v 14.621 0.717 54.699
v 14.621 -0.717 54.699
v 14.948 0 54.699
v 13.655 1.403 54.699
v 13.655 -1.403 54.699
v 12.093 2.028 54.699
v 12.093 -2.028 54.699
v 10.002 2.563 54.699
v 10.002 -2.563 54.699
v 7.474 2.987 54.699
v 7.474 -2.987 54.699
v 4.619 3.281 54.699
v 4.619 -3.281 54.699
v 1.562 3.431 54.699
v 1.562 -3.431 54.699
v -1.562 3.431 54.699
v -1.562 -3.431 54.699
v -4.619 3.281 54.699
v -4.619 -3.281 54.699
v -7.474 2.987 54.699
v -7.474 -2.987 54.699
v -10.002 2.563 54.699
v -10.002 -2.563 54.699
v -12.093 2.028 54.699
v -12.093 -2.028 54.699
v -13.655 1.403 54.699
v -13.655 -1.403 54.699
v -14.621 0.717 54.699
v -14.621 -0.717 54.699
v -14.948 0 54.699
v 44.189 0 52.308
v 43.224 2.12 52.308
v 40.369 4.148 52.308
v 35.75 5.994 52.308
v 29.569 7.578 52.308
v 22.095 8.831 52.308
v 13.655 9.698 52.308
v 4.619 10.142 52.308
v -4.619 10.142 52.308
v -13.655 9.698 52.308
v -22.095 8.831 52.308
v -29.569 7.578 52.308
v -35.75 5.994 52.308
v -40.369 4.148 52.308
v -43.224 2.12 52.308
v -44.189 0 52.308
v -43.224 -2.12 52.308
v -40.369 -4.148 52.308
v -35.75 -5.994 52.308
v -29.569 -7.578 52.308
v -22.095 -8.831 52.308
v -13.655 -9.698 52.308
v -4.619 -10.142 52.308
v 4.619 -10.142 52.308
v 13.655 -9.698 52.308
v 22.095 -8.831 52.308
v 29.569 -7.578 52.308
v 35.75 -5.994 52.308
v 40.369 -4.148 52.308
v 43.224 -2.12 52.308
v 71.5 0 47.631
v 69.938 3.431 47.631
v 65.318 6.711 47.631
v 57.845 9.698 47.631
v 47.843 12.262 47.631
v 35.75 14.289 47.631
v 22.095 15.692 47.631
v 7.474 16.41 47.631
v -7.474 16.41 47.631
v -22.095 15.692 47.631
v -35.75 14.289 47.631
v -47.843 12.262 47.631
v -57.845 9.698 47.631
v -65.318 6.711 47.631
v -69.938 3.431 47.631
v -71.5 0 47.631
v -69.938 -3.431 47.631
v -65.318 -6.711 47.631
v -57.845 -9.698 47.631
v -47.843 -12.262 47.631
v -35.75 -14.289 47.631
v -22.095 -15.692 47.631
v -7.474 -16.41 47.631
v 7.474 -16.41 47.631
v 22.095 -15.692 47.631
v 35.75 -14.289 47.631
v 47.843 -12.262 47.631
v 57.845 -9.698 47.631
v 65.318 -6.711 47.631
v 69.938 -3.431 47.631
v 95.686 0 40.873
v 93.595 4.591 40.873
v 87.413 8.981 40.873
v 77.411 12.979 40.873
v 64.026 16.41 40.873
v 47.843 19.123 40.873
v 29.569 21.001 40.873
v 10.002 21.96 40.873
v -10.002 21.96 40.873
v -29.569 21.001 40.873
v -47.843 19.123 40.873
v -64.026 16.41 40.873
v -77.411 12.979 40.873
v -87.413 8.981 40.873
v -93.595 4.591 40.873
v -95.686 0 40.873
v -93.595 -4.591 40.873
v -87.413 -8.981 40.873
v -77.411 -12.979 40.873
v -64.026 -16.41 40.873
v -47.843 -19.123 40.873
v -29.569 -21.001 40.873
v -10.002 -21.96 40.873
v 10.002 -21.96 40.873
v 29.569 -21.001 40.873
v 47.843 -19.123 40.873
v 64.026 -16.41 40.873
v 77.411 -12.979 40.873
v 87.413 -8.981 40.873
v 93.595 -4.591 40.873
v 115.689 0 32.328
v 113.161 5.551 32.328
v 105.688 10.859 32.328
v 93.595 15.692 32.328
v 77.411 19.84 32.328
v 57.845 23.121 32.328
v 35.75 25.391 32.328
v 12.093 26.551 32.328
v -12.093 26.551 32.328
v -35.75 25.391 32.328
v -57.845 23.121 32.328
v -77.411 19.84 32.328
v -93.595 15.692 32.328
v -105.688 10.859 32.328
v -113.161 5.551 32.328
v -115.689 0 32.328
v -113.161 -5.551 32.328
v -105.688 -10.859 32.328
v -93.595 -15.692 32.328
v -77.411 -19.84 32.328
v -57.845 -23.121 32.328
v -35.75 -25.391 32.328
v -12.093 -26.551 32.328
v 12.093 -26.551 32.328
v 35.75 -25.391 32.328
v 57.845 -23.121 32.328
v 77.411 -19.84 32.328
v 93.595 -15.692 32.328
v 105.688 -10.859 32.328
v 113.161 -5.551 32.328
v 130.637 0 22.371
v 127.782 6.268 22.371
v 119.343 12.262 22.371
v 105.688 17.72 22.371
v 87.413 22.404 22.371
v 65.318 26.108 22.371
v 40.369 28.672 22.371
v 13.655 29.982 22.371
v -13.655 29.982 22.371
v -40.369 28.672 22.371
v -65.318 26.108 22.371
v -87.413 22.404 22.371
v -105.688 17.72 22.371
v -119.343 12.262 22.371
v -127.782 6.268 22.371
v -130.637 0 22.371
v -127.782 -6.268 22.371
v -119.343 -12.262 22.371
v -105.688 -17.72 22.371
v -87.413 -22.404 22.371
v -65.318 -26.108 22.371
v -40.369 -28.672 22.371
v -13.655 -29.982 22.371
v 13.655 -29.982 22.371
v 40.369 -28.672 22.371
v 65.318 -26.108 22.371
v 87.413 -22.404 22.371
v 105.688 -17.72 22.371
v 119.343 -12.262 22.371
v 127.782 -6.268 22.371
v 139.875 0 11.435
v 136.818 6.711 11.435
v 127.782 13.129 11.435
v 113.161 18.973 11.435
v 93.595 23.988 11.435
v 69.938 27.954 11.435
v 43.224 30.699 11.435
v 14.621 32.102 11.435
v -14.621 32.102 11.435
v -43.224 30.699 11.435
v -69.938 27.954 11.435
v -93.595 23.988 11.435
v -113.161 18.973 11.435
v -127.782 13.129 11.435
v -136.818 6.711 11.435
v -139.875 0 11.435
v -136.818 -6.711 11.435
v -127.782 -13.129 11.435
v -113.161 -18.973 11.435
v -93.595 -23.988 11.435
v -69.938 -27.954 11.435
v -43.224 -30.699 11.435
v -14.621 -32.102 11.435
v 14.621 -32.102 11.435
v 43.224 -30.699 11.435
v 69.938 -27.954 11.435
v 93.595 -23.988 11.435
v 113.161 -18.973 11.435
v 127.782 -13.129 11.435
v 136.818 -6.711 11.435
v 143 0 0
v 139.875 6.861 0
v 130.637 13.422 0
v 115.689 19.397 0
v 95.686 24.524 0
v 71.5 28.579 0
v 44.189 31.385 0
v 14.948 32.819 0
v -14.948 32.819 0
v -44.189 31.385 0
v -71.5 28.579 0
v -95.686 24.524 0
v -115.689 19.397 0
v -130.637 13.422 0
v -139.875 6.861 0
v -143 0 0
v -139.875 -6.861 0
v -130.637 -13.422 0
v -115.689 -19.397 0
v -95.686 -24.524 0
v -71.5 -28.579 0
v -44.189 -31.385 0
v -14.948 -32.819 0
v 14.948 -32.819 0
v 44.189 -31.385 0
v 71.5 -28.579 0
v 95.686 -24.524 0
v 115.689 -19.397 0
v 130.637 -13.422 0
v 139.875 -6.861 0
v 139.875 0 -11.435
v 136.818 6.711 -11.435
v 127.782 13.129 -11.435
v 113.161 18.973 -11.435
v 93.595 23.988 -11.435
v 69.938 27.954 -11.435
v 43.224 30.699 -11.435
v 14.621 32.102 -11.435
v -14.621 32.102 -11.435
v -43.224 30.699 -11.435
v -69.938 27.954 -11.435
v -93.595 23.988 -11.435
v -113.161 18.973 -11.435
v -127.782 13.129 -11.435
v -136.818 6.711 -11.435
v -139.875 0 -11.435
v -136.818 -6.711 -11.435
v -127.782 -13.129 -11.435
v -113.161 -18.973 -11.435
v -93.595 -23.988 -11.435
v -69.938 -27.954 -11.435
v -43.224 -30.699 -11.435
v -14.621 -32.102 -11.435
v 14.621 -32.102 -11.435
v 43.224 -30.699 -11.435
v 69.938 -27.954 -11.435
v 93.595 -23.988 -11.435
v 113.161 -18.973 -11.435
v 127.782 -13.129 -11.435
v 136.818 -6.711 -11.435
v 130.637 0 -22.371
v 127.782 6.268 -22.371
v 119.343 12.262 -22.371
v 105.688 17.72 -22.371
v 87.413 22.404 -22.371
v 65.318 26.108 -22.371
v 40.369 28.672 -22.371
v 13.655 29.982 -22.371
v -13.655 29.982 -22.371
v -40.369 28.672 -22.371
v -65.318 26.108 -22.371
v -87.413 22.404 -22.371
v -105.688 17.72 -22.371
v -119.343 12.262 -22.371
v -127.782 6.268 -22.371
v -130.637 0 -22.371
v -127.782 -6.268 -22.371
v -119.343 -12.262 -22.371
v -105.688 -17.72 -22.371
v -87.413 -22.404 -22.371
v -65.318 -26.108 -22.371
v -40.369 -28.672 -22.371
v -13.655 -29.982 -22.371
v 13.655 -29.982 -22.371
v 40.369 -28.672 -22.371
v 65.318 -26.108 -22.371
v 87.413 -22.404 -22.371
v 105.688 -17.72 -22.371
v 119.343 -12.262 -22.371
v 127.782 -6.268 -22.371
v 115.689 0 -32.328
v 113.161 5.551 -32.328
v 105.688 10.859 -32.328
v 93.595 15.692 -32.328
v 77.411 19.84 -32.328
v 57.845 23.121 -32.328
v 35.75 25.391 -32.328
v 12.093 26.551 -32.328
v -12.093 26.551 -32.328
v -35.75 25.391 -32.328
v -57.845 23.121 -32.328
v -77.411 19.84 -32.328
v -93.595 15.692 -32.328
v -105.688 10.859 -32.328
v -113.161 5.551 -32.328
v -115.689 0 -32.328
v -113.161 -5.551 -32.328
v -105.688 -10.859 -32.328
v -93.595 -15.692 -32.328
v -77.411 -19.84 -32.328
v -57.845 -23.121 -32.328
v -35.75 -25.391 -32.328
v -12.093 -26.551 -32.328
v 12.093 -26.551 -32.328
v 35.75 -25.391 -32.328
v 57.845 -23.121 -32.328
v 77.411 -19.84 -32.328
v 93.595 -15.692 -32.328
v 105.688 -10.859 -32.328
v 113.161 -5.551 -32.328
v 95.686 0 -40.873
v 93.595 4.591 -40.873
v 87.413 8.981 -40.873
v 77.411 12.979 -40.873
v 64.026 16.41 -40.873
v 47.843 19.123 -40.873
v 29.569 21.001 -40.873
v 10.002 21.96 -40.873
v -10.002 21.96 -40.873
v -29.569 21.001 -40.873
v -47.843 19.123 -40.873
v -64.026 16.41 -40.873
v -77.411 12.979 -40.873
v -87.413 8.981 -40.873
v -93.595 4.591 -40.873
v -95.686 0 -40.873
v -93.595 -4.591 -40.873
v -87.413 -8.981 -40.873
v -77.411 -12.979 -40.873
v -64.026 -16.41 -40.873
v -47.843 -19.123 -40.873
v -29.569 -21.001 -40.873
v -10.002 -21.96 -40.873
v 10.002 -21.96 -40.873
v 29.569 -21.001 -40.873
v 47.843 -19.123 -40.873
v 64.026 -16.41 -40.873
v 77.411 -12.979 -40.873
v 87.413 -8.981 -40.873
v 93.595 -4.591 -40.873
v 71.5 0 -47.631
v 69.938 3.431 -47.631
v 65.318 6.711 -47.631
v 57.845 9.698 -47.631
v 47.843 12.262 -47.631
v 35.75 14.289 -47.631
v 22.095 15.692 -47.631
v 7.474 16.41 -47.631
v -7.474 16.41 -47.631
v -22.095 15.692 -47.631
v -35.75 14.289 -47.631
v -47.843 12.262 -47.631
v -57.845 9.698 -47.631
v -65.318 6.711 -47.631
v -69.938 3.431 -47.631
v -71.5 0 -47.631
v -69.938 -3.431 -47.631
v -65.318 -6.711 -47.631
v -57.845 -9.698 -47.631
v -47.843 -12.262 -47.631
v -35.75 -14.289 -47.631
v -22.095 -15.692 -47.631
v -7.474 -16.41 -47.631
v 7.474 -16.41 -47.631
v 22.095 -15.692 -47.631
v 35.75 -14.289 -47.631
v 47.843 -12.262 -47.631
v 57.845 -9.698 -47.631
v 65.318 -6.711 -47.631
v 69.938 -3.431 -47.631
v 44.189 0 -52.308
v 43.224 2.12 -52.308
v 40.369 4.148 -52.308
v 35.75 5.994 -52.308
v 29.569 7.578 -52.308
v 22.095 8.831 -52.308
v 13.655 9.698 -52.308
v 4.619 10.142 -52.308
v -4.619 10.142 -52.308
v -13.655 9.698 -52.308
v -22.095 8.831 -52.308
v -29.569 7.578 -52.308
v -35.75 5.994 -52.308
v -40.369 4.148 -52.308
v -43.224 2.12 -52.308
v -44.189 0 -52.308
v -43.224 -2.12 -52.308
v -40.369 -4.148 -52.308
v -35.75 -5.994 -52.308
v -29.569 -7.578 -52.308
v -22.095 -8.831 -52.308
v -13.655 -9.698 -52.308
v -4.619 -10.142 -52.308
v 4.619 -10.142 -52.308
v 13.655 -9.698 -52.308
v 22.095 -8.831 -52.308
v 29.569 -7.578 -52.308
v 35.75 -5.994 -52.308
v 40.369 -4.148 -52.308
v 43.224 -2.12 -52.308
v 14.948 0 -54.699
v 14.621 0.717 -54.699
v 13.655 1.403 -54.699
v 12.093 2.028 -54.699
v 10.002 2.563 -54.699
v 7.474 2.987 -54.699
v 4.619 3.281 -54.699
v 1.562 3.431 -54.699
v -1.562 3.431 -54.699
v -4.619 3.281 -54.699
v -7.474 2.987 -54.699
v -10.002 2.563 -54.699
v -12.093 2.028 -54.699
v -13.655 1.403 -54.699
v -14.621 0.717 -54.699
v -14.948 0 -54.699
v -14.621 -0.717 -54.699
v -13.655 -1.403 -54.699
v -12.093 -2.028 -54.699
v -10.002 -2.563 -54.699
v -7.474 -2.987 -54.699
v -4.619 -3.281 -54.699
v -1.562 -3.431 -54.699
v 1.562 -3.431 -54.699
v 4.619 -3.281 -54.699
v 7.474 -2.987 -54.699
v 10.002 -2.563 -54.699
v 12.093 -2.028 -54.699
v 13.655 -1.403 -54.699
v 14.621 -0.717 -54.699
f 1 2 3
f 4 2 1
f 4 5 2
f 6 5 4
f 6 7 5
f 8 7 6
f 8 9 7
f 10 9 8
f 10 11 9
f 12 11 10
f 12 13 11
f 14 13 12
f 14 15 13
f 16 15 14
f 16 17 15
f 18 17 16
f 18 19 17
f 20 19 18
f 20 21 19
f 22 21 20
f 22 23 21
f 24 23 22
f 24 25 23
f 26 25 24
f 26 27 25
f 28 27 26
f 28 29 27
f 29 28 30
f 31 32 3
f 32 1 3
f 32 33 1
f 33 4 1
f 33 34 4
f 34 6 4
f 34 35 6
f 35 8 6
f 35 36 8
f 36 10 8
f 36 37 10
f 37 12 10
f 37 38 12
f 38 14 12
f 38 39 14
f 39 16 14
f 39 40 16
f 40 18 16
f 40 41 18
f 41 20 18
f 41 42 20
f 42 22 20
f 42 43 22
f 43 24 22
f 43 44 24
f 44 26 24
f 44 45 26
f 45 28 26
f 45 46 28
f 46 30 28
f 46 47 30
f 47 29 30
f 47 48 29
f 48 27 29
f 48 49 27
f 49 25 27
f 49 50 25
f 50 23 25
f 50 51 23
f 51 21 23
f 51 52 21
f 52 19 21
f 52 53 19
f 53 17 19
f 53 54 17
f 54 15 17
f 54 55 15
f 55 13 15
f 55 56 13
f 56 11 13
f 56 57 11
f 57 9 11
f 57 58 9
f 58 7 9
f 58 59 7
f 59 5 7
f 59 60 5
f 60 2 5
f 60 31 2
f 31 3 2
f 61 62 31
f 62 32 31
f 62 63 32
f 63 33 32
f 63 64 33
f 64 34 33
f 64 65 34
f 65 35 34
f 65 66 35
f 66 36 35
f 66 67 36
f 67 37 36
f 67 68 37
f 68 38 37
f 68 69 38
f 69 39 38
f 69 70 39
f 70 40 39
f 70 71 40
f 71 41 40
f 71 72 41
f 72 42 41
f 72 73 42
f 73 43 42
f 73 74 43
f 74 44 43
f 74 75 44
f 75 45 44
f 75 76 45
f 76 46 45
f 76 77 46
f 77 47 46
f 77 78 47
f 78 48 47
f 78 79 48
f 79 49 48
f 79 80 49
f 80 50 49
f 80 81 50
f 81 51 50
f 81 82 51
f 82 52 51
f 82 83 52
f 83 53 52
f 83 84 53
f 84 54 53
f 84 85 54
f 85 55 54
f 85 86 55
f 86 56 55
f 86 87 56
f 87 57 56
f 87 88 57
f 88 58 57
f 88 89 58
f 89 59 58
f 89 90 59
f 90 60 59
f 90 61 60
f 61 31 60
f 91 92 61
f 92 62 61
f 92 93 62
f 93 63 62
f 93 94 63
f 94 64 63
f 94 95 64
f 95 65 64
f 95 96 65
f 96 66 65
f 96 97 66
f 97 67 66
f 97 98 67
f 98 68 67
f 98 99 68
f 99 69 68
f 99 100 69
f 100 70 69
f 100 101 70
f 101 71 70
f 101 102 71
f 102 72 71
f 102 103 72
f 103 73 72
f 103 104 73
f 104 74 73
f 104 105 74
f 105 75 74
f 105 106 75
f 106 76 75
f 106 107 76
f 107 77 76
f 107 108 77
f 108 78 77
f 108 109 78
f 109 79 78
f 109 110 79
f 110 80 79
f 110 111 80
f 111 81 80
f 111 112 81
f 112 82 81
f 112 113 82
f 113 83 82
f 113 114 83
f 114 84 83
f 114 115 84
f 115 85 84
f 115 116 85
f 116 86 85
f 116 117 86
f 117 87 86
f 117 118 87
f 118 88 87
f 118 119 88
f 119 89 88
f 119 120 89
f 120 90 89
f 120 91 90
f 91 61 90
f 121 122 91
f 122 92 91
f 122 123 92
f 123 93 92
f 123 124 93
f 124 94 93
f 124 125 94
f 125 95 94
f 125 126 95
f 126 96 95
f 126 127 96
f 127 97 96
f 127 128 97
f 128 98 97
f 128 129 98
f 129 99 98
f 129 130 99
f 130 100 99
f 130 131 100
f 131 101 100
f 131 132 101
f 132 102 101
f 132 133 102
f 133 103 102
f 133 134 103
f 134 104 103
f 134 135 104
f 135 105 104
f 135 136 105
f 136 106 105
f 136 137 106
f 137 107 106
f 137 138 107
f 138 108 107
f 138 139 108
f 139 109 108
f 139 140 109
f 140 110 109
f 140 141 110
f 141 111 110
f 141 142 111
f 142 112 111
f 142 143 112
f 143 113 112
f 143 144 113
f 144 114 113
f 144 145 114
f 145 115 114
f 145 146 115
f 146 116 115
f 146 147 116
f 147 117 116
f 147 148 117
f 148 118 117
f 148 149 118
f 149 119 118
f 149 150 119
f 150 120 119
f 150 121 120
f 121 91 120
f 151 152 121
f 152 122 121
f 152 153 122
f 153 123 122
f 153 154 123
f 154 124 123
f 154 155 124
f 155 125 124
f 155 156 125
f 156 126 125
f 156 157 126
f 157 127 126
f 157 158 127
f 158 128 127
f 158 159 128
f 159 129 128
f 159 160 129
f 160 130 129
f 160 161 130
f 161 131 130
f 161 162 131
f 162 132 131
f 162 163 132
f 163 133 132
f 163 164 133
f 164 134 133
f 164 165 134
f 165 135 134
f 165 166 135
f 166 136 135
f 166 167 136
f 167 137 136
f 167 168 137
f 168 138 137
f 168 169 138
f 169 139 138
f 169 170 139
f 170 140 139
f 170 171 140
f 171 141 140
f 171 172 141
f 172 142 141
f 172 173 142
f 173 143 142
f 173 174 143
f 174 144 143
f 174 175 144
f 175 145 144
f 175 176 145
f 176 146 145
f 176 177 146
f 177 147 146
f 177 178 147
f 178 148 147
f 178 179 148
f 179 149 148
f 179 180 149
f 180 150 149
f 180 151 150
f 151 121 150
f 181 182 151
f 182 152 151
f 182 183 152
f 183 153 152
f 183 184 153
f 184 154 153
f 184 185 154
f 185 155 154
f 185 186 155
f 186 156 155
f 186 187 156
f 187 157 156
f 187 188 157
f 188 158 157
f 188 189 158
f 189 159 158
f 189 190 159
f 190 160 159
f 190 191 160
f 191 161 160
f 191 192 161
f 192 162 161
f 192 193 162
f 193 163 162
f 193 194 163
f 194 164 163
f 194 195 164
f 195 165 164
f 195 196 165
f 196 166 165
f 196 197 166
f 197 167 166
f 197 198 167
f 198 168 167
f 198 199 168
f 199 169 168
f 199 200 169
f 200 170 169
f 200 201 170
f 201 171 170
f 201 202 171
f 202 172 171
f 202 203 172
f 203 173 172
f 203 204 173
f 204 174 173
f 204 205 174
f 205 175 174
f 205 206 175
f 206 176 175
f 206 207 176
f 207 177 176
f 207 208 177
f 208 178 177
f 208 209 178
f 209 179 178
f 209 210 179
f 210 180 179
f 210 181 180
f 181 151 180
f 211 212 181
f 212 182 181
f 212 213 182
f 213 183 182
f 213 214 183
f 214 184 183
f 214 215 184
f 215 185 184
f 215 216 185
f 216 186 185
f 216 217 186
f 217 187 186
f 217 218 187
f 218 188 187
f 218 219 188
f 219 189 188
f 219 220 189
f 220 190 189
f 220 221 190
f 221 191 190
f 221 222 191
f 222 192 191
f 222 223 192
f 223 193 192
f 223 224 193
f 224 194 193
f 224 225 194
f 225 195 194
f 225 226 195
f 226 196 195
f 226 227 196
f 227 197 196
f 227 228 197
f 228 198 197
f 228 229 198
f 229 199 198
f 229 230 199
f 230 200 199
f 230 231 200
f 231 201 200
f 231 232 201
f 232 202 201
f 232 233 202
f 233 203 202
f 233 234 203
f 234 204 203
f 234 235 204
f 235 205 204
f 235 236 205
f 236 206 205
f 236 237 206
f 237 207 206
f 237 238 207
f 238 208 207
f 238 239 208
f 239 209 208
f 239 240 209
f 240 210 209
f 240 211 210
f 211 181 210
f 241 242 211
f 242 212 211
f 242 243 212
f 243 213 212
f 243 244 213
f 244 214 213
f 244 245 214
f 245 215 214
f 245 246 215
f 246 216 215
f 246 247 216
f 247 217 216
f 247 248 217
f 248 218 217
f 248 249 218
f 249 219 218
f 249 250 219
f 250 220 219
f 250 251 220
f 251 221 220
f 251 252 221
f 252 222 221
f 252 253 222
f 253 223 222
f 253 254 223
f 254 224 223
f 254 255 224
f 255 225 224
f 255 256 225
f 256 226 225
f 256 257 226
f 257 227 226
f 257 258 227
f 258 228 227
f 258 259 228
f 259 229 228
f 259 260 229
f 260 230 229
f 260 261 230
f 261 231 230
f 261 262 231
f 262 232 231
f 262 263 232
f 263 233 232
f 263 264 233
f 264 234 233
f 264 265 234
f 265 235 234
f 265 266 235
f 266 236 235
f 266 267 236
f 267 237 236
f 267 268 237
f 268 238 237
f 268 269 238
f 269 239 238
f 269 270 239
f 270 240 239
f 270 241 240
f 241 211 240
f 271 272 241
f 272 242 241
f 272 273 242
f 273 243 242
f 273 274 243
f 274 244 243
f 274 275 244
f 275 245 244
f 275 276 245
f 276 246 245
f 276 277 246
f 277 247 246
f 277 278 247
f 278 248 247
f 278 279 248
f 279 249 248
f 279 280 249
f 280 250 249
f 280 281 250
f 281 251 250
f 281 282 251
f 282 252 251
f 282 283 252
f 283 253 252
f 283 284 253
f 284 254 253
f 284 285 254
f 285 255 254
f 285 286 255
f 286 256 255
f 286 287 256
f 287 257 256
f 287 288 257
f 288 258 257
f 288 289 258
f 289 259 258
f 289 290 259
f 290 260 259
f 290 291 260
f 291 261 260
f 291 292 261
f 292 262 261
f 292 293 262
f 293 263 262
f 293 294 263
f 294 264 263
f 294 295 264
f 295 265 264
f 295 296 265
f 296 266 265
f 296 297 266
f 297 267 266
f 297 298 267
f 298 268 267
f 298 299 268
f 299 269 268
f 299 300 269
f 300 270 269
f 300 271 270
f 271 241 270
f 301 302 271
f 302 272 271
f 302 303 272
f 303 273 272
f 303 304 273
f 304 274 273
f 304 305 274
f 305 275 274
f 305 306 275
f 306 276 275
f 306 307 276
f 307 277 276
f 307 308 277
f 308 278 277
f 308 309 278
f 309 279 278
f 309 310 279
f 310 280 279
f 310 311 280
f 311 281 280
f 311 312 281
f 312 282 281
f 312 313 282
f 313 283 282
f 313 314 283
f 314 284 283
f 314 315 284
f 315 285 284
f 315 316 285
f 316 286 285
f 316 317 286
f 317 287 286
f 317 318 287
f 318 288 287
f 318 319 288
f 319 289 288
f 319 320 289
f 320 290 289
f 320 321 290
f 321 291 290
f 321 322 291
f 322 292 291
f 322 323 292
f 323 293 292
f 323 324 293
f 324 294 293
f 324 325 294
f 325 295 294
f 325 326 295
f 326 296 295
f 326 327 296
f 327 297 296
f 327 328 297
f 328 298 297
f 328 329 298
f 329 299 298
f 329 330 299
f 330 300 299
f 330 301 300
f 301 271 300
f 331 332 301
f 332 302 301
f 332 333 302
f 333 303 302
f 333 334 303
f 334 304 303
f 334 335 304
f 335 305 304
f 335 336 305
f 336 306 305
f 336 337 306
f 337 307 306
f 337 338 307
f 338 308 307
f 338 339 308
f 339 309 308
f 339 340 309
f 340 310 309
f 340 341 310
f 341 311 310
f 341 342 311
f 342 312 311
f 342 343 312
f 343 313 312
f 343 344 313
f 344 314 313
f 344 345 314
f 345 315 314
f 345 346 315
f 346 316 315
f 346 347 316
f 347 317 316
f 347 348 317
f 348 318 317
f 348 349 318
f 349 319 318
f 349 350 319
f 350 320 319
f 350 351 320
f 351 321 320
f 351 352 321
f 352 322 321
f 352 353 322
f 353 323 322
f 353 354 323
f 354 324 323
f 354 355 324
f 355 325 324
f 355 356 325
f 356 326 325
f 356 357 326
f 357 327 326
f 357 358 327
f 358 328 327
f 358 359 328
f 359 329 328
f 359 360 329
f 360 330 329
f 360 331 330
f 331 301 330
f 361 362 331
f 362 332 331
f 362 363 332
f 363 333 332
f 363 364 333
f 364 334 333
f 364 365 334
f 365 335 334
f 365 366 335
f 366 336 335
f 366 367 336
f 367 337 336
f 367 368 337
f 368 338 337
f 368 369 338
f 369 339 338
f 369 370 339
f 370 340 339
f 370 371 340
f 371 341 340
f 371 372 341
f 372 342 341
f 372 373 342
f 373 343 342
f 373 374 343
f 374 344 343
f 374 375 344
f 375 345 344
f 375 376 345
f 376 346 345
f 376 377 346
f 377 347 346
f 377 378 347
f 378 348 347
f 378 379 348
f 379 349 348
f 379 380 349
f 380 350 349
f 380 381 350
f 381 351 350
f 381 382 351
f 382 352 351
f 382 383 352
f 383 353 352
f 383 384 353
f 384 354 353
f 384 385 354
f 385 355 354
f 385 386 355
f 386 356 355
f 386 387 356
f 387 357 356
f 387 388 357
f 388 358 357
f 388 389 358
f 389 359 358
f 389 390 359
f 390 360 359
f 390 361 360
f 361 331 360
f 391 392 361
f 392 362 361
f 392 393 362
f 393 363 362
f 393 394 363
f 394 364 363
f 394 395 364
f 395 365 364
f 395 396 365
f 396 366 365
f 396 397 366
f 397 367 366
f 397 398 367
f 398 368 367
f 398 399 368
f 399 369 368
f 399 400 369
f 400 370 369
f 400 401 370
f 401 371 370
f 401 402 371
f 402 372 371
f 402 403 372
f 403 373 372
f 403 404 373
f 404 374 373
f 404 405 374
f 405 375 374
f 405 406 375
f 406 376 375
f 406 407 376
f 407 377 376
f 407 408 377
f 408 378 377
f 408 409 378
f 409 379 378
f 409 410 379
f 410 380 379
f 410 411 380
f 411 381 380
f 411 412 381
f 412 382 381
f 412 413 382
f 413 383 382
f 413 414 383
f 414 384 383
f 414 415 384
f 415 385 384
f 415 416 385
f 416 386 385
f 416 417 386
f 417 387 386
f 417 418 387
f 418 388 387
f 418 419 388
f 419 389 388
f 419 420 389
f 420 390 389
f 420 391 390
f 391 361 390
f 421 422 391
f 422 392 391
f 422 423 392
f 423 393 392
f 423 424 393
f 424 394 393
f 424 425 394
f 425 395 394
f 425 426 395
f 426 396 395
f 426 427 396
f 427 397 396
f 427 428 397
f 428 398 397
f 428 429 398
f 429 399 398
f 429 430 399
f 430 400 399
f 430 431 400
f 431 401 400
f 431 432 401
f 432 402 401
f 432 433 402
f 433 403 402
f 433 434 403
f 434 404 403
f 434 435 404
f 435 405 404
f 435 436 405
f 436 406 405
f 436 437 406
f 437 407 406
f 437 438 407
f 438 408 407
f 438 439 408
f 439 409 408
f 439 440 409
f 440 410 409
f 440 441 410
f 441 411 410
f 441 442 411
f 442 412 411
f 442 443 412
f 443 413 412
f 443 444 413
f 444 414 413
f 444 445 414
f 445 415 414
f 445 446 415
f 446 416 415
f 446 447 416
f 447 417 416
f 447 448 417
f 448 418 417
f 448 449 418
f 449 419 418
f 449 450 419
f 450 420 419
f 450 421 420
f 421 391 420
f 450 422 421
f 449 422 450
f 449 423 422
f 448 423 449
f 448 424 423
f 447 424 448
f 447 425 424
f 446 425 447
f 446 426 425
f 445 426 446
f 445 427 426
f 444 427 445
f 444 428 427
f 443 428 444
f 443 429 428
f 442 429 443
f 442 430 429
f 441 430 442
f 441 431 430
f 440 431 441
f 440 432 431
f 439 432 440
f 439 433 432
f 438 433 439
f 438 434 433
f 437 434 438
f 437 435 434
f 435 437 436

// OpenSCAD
// Generated by SolidPython 1.0.1 on 2020-07-29 00:46:50


scale(v = [13, 3, 5]) {
	sphere(r = 11);
}
/***********************************************
*********      SolidPython code:      **********
************************************************
 
# import packages: SolidPython
from solid import *
from solid.utils import *
from itertools import chain, combinations, permutations


class Resize:

    def __init__(self, scad_file):
        self.scad_file = scad_file
        #self.scad_file = import_scad(scad_file)
        # cone/cylinder param:
        self.r1 = 0
        self.r2 = 0
        self.h = 0
        # rectangular prism param:
        self.w = 0
        self.l = 0
        # ellipse param:
        self.r = 0

    # import OpenScad code (file name corresponds to shape)


    # classify shape + parameters
    def assign(self, param1, param2, param3):
        if self.scad_file == 'cone.scad':
            self.r1 = param1
            self.r2 = param2
            self.h = param3
        elif self.scad_file == 'cylinder.scad':
            self.r1 = param1
            self.r2 = param2
            self.h = param3
        elif self.scad_file == 'rectangularPrism.scad':
            self.h = param1
            self.l = param2
            self.w = param3
        else:
            self.r = param1
            self.h = param2

    # resize parameters
    def iterate(self):
        x = range(3, 20, 2)
        i = 1
        if self.scad_file == 'cone.scad':
            tempList = list(permutations(x, 2))
            for temp in tempList:
                param1 = temp[0]
                param2 = temp[1]
                filepath = 'produced_scad_files/' + 'cone' + str(param1) + '_' + str(param2) + '_' + '.scad'
                scad_render_to_file(cylinder(h=param1, r1=param2, r2=0), filepath)

        elif self.scad_file == 'cylinder.scad':
            tempList = list(permutations(x, 3))
            for temp in tempList:
                param1 = temp[0]
                param2 = temp[1]
                filepath = 'produced_scad_files/' + 'cylinder' + str(param1) + '_' + str(param2) + '_' + '.scad'
                scad_render_to_file(cylinder(h=param1, r1=param2, r2=param2), filepath)

        elif self.scad_file == 'rectangularPrism.scad':
            tempList = list(permutations(x, 3))
            for temp in tempList:
                param1 = temp[0]
                param2 = temp[1]
                param3 = temp[2]
                filepath = 'produced_scad_files/' + 'rectangularPrism' + str(param1) + '_' + str(param2) + '_' + str(
                    param3) + '.scad'
                scad_render_to_file(cube(size=(param1, param2, param3)), filepath)

        elif self.scad_file == 'ellipse.scad':
            tempList = list(permutations(x, 4))
            for temp in tempList:
                param1 = temp[0]
                param2 = temp[1]
                param3 = temp[2]
                param4 = temp[3]
                filepath = 'produced_scad_files/' + 'ellipse' + str(param1) + '_' + str(param2) + '_' + str(param3) + '_' + str(param4) + '.scad'
                scad_render_to_file(scale([param1, param2, param3])(sphere(r=param4)), filepath)

    def render_to_scadfile(self):
        scad_render_to_file(scad, 'example.scad') 
 
************************************************/
